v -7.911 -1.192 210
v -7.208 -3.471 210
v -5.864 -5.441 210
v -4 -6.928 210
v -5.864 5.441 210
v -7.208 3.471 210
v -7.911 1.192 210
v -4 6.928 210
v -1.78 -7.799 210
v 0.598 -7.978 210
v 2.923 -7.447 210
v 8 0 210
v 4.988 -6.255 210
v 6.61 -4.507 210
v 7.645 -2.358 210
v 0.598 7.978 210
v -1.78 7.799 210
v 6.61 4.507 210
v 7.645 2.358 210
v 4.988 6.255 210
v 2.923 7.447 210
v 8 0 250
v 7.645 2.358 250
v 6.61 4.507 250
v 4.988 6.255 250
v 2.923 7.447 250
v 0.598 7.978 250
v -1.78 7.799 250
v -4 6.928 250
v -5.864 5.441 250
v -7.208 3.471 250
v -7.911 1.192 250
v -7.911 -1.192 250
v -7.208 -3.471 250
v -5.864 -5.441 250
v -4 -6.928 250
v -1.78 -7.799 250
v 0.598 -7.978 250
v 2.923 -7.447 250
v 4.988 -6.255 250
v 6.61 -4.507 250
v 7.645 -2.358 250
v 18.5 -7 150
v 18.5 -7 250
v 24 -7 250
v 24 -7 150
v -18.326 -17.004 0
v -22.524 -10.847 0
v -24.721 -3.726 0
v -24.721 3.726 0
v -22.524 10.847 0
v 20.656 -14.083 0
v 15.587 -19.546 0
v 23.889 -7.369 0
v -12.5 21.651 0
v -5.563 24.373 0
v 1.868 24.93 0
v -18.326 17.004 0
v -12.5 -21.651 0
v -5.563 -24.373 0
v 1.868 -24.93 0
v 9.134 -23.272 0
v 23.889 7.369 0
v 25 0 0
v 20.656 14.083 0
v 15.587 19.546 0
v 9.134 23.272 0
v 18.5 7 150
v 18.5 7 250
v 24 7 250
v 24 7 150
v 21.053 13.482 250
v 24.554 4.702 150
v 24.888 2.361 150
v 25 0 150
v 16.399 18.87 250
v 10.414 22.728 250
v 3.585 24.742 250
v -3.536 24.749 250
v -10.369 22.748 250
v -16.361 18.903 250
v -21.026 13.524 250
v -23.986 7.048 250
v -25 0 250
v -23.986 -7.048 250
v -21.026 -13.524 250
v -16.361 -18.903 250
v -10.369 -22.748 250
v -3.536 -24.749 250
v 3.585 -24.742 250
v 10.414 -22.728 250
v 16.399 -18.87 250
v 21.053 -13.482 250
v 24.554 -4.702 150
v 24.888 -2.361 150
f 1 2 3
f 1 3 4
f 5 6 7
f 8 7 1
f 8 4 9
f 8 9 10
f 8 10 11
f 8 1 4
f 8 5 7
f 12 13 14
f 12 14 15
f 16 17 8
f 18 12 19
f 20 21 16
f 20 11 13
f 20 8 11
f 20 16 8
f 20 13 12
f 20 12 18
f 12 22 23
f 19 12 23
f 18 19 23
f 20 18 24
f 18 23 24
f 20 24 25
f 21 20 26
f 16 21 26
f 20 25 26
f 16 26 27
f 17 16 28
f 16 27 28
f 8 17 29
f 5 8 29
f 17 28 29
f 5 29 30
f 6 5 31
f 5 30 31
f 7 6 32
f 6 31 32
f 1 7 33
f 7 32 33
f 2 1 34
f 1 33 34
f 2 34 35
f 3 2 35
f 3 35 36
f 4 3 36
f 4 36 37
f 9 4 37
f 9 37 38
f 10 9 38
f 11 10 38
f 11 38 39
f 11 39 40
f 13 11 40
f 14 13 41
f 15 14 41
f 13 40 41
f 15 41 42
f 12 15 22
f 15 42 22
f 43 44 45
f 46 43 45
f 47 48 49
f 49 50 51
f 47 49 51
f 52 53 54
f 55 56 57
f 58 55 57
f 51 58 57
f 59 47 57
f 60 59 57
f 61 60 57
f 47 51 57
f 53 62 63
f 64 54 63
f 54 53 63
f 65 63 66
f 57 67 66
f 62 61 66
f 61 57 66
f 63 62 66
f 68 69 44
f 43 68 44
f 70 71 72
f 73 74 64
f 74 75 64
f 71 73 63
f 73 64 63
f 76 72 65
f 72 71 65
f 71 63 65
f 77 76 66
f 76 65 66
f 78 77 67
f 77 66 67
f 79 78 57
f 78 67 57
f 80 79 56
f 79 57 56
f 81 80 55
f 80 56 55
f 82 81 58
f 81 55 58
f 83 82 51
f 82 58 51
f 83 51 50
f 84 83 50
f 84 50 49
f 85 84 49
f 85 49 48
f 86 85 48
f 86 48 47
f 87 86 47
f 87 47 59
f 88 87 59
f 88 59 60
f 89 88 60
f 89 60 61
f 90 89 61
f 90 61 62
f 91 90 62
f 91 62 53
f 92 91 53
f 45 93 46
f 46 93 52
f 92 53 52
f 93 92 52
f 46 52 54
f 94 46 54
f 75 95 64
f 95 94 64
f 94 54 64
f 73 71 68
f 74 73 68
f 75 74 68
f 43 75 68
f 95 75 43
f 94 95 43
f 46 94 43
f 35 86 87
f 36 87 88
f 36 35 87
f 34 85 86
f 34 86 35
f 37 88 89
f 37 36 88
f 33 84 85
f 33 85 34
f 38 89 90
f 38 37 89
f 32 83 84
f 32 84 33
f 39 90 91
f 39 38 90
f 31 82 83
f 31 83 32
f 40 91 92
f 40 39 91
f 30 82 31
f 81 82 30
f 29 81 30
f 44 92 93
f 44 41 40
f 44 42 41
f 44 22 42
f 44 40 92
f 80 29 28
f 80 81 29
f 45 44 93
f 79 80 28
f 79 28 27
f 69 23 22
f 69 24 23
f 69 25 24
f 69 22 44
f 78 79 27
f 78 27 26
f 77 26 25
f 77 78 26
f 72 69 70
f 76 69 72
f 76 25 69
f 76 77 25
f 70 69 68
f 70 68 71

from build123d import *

# Parameters (mm, degrees)
SKETCH_1_R          = 25
EXTRUDE_1_DEPTH     = 250
SKETCH_2_W          = 14
SKETCH_2_H          = 10
CUT_EXTRUDE_1_DEPTH = 100
SKETCH_3_R          = 8
CUT_EXTRUDE_2_DEPTH = 40


with BuildPart() as part:
    # 草图1 → 凸台-拉伸1 (new body)
    with BuildSketch(Plane(origin=(0, 0, 0), x_dir=(0, -1, 0), z_dir=(0, 0, 1))):
        with Locations(Location((0, 0, 0), (0, 0, 90))):
            Circle(SKETCH_1_R)
    extrude(amount=EXTRUDE_1_DEPTH)

    # 草图2 → 切除-拉伸1 (cut)
    with BuildSketch(Plane(origin=(0, 0, 250), x_dir=(0, -1, 0), z_dir=(0, 0, 1))):
        with Locations((0, 23.5)):
            Rectangle(SKETCH_2_W, SKETCH_2_H)
    extrude(amount=-CUT_EXTRUDE_1_DEPTH, mode=Mode.SUBTRACT)

    # 草图3 → 切除-拉伸2 (cut)
    with BuildSketch(Plane.XY.offset(250)):
        Circle(SKETCH_3_R)
    extrude(amount=-CUT_EXTRUDE_2_DEPTH, mode=Mode.SUBTRACT)


solid = part.part
